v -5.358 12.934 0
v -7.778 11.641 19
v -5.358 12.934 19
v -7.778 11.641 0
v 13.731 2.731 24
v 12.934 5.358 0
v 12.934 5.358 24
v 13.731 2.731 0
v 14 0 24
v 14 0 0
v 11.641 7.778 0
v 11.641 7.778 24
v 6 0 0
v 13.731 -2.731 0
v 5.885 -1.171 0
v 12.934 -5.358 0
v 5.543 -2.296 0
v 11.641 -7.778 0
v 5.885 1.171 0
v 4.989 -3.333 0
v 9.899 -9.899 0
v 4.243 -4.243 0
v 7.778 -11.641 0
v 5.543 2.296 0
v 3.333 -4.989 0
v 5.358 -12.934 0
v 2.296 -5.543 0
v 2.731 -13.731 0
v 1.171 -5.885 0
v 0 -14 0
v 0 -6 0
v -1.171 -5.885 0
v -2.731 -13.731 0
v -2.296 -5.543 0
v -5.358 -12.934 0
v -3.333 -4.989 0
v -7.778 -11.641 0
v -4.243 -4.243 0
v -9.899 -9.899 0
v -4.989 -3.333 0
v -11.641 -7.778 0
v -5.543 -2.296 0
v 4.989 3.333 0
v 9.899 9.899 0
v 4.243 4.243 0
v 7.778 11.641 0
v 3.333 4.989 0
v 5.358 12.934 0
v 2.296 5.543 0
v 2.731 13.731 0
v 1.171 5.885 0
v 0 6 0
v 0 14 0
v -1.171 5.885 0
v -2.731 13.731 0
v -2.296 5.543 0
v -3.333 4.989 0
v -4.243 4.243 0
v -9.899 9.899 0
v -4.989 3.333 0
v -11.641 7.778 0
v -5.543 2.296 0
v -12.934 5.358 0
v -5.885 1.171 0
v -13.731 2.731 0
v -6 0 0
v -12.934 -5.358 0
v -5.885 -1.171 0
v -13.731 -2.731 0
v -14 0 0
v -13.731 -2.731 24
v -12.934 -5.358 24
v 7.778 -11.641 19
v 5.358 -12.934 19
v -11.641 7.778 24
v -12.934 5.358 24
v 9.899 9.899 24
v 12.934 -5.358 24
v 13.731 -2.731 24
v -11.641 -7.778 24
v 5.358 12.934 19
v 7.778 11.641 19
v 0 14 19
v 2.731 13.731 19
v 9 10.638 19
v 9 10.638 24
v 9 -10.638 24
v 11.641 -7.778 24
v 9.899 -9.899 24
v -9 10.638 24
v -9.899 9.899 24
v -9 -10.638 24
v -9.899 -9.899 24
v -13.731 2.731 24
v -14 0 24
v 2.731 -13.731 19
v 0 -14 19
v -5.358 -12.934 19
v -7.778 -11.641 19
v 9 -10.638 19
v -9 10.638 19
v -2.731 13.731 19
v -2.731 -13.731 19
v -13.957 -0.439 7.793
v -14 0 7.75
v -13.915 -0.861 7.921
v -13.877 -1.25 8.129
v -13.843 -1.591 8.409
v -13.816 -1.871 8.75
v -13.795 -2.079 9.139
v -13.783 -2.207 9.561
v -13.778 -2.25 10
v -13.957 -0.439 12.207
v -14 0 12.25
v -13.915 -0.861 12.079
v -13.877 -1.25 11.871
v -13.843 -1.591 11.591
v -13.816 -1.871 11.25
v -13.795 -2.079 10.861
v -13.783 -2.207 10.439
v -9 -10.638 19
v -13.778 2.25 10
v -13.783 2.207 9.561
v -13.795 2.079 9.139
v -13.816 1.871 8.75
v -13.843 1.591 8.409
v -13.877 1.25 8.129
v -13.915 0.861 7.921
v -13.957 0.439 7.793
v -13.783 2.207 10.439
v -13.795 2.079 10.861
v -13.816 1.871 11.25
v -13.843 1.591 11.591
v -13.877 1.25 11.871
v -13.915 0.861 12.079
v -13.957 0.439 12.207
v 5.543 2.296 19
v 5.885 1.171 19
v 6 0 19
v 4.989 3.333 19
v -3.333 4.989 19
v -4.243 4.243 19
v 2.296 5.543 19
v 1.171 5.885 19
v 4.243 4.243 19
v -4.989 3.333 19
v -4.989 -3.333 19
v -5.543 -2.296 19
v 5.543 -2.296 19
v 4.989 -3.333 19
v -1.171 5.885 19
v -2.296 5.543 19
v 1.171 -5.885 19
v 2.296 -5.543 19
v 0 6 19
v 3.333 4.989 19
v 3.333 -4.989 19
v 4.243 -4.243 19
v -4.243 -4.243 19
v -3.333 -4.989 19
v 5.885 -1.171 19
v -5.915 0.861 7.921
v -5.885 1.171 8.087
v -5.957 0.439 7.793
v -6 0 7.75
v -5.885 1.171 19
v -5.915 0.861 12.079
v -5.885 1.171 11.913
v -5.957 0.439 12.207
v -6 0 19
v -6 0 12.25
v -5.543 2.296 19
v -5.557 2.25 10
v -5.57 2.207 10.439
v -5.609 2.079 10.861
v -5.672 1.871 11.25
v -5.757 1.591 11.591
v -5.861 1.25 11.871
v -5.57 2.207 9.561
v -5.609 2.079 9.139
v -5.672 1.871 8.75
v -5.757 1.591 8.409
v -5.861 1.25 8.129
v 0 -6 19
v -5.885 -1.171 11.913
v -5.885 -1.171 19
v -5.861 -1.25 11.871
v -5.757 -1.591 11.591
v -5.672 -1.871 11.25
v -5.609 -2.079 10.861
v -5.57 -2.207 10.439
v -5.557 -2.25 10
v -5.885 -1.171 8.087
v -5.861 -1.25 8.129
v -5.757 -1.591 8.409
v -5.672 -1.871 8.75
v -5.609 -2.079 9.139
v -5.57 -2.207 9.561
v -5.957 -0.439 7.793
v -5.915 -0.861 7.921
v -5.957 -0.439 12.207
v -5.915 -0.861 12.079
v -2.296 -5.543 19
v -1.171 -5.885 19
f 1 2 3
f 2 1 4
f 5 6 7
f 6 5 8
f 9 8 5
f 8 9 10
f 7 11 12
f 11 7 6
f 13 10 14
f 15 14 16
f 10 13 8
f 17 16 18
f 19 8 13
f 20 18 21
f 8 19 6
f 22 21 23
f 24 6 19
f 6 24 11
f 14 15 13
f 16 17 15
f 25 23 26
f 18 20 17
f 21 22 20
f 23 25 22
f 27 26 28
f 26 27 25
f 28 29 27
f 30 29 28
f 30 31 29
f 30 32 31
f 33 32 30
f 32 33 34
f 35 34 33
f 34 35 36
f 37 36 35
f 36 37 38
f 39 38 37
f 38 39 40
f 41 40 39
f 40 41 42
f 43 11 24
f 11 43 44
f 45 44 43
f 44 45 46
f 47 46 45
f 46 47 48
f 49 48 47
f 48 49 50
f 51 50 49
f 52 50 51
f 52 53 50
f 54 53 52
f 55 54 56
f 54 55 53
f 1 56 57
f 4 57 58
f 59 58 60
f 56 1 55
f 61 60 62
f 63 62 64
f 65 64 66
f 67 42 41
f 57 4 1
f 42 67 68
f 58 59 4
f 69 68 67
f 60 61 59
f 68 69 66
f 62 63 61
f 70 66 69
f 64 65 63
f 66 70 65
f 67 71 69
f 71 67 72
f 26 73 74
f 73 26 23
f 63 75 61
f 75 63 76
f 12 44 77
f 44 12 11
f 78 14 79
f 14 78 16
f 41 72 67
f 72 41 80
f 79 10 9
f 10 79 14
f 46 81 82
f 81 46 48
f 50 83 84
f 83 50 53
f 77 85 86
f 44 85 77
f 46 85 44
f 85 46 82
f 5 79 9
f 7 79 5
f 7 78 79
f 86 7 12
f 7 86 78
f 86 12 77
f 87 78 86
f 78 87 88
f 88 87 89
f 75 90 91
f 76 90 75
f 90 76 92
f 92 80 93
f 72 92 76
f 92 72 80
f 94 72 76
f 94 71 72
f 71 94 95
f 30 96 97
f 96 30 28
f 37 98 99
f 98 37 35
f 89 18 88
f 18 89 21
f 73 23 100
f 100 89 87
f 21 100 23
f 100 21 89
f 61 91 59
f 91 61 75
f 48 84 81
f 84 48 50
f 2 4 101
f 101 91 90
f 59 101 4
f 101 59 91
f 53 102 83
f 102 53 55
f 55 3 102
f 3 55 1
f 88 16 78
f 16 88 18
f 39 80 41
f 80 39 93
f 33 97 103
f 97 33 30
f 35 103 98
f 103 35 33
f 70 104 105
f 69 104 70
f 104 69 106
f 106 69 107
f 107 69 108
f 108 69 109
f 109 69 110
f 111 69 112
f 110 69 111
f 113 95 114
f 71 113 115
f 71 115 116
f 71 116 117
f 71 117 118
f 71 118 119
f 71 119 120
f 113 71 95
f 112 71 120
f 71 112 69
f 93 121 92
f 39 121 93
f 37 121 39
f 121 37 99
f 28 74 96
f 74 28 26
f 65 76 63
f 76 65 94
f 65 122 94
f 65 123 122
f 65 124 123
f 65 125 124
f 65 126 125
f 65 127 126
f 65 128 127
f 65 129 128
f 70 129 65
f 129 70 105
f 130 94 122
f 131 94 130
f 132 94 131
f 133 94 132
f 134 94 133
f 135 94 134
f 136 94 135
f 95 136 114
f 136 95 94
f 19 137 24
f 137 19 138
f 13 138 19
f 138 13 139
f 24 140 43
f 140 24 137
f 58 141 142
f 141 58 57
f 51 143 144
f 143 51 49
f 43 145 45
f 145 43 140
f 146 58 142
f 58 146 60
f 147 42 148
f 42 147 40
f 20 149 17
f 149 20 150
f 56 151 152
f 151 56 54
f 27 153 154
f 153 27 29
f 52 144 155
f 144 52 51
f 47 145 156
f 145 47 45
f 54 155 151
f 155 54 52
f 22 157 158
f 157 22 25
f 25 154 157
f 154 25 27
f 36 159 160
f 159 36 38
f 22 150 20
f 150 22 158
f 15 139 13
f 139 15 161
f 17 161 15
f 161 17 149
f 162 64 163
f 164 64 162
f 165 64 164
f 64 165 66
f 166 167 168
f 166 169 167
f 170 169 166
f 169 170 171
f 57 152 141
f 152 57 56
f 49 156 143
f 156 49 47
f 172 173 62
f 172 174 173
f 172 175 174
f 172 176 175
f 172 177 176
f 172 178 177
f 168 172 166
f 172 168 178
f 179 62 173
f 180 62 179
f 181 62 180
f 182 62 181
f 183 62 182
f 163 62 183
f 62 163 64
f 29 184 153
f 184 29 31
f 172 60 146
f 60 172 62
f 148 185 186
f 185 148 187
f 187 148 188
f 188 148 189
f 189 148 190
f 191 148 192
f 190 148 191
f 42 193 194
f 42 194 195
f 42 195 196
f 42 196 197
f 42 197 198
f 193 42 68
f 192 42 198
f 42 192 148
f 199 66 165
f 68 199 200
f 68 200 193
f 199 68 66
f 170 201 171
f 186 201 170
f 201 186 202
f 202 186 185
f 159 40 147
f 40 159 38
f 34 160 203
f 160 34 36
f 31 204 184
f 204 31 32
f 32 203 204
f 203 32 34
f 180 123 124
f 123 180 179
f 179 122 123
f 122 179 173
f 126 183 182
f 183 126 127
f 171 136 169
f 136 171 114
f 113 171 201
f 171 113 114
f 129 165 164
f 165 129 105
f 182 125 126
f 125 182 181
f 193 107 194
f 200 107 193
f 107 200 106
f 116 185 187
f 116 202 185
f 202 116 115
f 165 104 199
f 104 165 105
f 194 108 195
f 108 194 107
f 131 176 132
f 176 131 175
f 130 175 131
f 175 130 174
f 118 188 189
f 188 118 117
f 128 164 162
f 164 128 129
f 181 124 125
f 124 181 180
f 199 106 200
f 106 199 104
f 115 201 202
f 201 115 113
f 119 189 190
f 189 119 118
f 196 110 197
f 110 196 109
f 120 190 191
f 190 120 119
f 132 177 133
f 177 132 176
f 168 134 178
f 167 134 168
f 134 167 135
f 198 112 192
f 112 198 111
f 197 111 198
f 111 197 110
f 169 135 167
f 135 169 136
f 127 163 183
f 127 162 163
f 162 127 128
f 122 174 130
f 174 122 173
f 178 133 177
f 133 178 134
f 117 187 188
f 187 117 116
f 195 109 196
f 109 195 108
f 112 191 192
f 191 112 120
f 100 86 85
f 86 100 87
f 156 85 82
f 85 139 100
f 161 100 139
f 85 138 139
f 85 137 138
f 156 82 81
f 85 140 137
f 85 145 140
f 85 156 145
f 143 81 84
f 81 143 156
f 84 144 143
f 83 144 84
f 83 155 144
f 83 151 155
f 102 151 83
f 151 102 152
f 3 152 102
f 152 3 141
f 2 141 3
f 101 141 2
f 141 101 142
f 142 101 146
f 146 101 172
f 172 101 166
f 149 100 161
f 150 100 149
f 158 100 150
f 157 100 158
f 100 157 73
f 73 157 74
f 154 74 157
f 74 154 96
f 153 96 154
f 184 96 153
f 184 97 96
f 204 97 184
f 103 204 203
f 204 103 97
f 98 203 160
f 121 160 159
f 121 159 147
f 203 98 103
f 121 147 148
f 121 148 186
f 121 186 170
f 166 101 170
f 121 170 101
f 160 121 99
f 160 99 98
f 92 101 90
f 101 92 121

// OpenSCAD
$fn = 32;

// ----------------------------------------------------------------------
// Oldham coupling hub: 28 x 24 mm
// ----------------------------------------------------------------------

// --- parameters (mm) ---
hub_d = 28;               // hub diameter
hub_l = 20;               // hub length
bore_d = 12;              // shaft bore
tongue_w = 18;            // drive tongue width
tongue_h = 4;             // drive tongue height
set_d = 4.5;              // set screw tap hole

module hub() {
  /* the slot side is a raised disc with a groove milled across it */
  cylinder(h = hub_l + tongue_h, d = hub_d);
}

difference() {
  hub();
  translate([0, 0, -1]) cylinder(h = hub_l + tongue_h + 2, d = bore_d);
  translate([-hub_d / 2 - 1, 0, hub_l * 0.5])
    rotate([0, 90, 0]) cylinder(h = hub_d / 2 + 2, d = set_d);
  translate([-tongue_w / 2, -hub_d / 2 - 1, hub_l - 1])
    cube([tongue_w, hub_d + 2, tongue_h + 1]);
}
